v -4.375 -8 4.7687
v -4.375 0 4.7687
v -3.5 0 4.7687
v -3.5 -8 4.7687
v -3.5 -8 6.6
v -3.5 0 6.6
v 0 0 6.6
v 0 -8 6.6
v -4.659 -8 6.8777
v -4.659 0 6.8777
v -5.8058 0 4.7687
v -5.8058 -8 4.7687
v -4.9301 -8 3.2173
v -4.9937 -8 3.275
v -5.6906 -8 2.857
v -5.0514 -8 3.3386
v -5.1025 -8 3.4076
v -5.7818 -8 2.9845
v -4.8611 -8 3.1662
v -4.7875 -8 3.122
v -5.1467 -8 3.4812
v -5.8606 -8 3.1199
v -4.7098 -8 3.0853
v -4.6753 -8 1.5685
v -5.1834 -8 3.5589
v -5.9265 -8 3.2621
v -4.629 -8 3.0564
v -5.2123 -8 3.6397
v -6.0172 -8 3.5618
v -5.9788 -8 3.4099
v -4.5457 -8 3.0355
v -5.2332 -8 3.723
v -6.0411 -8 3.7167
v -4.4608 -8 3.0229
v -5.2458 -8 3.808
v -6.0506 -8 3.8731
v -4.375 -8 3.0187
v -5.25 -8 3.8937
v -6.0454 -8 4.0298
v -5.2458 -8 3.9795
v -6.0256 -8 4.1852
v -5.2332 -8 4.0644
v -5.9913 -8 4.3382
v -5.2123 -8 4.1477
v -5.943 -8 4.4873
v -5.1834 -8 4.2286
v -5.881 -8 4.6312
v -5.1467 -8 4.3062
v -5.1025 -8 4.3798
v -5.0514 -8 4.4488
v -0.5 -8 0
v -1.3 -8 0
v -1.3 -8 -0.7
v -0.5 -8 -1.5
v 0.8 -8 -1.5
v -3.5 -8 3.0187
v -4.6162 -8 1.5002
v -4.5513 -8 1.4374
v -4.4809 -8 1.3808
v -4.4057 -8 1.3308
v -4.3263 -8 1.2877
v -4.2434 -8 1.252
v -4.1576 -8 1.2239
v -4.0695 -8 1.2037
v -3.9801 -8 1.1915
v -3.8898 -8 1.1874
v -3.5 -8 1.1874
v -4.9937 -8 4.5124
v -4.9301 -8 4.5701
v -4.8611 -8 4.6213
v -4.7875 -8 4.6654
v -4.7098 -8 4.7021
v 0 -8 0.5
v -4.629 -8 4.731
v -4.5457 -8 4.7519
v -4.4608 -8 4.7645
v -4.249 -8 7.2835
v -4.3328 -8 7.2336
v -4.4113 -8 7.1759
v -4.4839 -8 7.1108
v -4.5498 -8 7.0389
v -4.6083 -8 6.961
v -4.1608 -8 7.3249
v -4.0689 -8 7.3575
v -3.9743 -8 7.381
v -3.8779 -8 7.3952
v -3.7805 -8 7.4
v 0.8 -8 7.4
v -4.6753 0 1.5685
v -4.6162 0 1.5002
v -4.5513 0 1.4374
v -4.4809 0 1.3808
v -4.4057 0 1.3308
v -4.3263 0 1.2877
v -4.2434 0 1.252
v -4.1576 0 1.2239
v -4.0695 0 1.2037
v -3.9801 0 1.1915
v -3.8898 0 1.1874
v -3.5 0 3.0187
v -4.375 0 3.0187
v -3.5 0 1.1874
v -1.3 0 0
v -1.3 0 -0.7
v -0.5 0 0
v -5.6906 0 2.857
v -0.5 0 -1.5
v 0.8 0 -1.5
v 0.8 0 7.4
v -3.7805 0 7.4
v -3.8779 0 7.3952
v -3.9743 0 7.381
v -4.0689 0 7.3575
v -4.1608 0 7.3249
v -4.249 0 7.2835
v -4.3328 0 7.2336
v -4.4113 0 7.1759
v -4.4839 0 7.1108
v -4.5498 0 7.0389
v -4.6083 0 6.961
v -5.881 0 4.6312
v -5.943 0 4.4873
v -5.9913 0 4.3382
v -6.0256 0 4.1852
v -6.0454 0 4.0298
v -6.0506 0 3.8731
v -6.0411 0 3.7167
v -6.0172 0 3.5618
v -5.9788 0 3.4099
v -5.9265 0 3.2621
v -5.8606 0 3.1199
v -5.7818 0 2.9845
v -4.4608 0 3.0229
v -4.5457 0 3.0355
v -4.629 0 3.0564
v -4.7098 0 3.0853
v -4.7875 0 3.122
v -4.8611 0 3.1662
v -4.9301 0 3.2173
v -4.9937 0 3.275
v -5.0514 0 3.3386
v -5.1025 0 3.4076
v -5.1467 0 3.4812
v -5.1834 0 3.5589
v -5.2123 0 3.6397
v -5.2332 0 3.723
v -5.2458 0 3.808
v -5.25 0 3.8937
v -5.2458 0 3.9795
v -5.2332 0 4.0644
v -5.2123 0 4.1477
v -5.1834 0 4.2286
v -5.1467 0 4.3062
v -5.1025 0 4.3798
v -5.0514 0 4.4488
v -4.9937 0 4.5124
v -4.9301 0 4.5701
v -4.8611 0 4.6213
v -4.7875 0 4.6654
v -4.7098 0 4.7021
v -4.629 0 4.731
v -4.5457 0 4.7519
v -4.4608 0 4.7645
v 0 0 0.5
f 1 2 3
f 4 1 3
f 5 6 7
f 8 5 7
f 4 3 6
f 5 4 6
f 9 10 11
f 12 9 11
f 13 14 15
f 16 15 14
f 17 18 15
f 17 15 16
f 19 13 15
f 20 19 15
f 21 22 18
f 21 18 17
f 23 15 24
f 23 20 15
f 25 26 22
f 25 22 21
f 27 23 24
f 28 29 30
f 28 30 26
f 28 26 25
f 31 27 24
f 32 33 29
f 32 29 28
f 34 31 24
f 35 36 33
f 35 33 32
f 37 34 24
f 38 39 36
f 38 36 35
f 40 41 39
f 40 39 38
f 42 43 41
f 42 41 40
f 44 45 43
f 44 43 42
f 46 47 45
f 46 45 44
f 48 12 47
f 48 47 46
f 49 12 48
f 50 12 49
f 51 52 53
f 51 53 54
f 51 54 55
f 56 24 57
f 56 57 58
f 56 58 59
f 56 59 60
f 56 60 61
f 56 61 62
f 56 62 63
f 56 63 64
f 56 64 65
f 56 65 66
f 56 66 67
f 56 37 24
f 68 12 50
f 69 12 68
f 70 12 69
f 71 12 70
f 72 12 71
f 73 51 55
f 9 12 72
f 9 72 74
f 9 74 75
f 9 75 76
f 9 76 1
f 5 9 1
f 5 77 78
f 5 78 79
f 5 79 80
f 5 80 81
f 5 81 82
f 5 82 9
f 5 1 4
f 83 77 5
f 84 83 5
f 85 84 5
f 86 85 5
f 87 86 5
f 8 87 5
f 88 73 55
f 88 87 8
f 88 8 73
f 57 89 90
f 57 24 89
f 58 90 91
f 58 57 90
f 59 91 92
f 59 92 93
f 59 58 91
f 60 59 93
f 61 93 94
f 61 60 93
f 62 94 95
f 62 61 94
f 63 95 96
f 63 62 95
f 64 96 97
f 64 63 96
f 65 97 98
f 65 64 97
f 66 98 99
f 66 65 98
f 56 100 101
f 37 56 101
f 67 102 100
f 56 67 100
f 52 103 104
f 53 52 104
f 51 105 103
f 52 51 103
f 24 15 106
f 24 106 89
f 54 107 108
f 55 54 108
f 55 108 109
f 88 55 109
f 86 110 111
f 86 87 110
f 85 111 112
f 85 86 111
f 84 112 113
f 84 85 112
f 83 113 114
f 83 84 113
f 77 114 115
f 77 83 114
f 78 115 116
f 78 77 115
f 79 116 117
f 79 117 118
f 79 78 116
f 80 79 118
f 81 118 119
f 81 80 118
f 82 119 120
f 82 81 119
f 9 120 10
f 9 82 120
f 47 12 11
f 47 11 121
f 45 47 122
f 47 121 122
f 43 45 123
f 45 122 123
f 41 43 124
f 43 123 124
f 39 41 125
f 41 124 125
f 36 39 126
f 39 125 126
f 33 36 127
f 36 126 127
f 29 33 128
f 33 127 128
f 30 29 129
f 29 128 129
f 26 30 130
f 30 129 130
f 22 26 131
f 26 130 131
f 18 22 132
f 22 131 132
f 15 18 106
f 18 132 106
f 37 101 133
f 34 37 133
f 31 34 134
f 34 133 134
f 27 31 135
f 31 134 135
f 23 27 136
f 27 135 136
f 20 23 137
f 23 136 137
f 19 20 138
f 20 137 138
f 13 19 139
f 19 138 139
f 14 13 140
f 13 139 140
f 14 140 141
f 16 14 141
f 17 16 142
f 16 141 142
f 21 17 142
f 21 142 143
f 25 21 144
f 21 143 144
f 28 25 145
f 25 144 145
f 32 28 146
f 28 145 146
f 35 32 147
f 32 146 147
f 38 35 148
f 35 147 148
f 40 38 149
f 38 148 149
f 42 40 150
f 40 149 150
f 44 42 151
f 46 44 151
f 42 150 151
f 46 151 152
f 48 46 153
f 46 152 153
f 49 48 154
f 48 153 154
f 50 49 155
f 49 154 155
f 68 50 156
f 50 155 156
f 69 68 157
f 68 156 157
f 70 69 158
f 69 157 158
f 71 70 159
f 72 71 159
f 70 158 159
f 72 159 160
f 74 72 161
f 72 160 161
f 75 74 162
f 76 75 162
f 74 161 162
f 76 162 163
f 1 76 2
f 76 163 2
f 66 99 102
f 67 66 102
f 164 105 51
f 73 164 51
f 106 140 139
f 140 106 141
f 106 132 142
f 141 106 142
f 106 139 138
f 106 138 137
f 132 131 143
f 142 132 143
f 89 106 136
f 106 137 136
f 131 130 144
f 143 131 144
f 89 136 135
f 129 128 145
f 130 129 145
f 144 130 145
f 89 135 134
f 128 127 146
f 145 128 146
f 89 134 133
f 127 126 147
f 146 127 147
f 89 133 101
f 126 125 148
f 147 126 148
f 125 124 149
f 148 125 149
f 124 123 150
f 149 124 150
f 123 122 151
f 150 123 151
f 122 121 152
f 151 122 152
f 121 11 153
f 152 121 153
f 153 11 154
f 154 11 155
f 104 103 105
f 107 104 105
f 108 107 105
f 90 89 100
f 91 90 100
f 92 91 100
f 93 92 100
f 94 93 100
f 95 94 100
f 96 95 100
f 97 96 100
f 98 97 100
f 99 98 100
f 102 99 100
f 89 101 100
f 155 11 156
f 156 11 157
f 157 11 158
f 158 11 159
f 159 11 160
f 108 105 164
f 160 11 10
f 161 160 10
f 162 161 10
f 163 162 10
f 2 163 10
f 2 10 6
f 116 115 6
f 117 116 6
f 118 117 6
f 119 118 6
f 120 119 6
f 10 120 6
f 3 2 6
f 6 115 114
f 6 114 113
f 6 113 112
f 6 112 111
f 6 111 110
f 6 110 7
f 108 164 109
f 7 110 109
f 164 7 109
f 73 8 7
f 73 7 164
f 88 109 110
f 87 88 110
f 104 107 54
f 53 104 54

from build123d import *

# Parameters (mm, degrees)
F1_DEPTH = 8
F2_SIZE  = 0.5
F3_SIZE  = 0.8
F4_R     = 1


with BuildPart() as f1:
    # F0 (on Front) → F1 (new body)
    with BuildSketch(Plane.XZ):
        with BuildLine():
            Line((0, 6.6), (0, 0))
            Line((0, 0), (-1.3, 0))
            Line((-1.3, 0), (-1.3, -1.5))
            Line((-1.3, -1.5), (0.8, -1.5))
            Line((0.8, -1.5), (0.8, 0))
            Line((0.8, 0), (0.8, 7.4))
            Line((0.8, 7.4), (-3.5, 7.4))
            Line((-3.5, 7.4), (-4.375, 7.4))
            Line((-4.375, 7.4), (-5.805823, 4.768717))
            ThreePointArc((-5.805823, 4.768717), (-6.047673, 3.794818), (-5.690622, 2.857009))
            Line((-5.690622, 2.857009), (-4.375, 1.187434))
            Line((-4.375, 1.187434), (-3.5, 1.187434))
            Line((-3.5, 1.187434), (-3.5, 3.018717))
            Line((-3.5, 3.018717), (-4.375, 3.018717))
            ThreePointArc((-4.375, 3.018717), (-5.25, 3.893717), (-4.375, 4.768717))
            Line((-4.375, 4.768717), (-3.5, 4.768717))
            Line((-3.5, 4.768717), (-3.5, 6.6))
            Line((-3.5, 6.6), (0, 6.6))
        make_face()
    extrude(amount=F1_DEPTH)

    # F2
    f2_edges = [f1.edges().sort_by_distance(p)[0] for p in [
        (0, -4, 0),
    ]]
    chamfer(f2_edges, length=F2_SIZE)

    # F3
    f3_edges = [f1.edges().sort_by_distance(p)[0] for p in [
        (-1.3, -4, -1.5),
    ]]
    chamfer(f3_edges, length=F3_SIZE)

    # F4
    f4_edges = [f1.edges().sort_by_distance(p)[0] for p in [
        (-4.375, -4, 1.187434),
        (-4.375, -4, 7.4),
    ]]
    fillet(f4_edges, radius=F4_R)


solid = f1.part
